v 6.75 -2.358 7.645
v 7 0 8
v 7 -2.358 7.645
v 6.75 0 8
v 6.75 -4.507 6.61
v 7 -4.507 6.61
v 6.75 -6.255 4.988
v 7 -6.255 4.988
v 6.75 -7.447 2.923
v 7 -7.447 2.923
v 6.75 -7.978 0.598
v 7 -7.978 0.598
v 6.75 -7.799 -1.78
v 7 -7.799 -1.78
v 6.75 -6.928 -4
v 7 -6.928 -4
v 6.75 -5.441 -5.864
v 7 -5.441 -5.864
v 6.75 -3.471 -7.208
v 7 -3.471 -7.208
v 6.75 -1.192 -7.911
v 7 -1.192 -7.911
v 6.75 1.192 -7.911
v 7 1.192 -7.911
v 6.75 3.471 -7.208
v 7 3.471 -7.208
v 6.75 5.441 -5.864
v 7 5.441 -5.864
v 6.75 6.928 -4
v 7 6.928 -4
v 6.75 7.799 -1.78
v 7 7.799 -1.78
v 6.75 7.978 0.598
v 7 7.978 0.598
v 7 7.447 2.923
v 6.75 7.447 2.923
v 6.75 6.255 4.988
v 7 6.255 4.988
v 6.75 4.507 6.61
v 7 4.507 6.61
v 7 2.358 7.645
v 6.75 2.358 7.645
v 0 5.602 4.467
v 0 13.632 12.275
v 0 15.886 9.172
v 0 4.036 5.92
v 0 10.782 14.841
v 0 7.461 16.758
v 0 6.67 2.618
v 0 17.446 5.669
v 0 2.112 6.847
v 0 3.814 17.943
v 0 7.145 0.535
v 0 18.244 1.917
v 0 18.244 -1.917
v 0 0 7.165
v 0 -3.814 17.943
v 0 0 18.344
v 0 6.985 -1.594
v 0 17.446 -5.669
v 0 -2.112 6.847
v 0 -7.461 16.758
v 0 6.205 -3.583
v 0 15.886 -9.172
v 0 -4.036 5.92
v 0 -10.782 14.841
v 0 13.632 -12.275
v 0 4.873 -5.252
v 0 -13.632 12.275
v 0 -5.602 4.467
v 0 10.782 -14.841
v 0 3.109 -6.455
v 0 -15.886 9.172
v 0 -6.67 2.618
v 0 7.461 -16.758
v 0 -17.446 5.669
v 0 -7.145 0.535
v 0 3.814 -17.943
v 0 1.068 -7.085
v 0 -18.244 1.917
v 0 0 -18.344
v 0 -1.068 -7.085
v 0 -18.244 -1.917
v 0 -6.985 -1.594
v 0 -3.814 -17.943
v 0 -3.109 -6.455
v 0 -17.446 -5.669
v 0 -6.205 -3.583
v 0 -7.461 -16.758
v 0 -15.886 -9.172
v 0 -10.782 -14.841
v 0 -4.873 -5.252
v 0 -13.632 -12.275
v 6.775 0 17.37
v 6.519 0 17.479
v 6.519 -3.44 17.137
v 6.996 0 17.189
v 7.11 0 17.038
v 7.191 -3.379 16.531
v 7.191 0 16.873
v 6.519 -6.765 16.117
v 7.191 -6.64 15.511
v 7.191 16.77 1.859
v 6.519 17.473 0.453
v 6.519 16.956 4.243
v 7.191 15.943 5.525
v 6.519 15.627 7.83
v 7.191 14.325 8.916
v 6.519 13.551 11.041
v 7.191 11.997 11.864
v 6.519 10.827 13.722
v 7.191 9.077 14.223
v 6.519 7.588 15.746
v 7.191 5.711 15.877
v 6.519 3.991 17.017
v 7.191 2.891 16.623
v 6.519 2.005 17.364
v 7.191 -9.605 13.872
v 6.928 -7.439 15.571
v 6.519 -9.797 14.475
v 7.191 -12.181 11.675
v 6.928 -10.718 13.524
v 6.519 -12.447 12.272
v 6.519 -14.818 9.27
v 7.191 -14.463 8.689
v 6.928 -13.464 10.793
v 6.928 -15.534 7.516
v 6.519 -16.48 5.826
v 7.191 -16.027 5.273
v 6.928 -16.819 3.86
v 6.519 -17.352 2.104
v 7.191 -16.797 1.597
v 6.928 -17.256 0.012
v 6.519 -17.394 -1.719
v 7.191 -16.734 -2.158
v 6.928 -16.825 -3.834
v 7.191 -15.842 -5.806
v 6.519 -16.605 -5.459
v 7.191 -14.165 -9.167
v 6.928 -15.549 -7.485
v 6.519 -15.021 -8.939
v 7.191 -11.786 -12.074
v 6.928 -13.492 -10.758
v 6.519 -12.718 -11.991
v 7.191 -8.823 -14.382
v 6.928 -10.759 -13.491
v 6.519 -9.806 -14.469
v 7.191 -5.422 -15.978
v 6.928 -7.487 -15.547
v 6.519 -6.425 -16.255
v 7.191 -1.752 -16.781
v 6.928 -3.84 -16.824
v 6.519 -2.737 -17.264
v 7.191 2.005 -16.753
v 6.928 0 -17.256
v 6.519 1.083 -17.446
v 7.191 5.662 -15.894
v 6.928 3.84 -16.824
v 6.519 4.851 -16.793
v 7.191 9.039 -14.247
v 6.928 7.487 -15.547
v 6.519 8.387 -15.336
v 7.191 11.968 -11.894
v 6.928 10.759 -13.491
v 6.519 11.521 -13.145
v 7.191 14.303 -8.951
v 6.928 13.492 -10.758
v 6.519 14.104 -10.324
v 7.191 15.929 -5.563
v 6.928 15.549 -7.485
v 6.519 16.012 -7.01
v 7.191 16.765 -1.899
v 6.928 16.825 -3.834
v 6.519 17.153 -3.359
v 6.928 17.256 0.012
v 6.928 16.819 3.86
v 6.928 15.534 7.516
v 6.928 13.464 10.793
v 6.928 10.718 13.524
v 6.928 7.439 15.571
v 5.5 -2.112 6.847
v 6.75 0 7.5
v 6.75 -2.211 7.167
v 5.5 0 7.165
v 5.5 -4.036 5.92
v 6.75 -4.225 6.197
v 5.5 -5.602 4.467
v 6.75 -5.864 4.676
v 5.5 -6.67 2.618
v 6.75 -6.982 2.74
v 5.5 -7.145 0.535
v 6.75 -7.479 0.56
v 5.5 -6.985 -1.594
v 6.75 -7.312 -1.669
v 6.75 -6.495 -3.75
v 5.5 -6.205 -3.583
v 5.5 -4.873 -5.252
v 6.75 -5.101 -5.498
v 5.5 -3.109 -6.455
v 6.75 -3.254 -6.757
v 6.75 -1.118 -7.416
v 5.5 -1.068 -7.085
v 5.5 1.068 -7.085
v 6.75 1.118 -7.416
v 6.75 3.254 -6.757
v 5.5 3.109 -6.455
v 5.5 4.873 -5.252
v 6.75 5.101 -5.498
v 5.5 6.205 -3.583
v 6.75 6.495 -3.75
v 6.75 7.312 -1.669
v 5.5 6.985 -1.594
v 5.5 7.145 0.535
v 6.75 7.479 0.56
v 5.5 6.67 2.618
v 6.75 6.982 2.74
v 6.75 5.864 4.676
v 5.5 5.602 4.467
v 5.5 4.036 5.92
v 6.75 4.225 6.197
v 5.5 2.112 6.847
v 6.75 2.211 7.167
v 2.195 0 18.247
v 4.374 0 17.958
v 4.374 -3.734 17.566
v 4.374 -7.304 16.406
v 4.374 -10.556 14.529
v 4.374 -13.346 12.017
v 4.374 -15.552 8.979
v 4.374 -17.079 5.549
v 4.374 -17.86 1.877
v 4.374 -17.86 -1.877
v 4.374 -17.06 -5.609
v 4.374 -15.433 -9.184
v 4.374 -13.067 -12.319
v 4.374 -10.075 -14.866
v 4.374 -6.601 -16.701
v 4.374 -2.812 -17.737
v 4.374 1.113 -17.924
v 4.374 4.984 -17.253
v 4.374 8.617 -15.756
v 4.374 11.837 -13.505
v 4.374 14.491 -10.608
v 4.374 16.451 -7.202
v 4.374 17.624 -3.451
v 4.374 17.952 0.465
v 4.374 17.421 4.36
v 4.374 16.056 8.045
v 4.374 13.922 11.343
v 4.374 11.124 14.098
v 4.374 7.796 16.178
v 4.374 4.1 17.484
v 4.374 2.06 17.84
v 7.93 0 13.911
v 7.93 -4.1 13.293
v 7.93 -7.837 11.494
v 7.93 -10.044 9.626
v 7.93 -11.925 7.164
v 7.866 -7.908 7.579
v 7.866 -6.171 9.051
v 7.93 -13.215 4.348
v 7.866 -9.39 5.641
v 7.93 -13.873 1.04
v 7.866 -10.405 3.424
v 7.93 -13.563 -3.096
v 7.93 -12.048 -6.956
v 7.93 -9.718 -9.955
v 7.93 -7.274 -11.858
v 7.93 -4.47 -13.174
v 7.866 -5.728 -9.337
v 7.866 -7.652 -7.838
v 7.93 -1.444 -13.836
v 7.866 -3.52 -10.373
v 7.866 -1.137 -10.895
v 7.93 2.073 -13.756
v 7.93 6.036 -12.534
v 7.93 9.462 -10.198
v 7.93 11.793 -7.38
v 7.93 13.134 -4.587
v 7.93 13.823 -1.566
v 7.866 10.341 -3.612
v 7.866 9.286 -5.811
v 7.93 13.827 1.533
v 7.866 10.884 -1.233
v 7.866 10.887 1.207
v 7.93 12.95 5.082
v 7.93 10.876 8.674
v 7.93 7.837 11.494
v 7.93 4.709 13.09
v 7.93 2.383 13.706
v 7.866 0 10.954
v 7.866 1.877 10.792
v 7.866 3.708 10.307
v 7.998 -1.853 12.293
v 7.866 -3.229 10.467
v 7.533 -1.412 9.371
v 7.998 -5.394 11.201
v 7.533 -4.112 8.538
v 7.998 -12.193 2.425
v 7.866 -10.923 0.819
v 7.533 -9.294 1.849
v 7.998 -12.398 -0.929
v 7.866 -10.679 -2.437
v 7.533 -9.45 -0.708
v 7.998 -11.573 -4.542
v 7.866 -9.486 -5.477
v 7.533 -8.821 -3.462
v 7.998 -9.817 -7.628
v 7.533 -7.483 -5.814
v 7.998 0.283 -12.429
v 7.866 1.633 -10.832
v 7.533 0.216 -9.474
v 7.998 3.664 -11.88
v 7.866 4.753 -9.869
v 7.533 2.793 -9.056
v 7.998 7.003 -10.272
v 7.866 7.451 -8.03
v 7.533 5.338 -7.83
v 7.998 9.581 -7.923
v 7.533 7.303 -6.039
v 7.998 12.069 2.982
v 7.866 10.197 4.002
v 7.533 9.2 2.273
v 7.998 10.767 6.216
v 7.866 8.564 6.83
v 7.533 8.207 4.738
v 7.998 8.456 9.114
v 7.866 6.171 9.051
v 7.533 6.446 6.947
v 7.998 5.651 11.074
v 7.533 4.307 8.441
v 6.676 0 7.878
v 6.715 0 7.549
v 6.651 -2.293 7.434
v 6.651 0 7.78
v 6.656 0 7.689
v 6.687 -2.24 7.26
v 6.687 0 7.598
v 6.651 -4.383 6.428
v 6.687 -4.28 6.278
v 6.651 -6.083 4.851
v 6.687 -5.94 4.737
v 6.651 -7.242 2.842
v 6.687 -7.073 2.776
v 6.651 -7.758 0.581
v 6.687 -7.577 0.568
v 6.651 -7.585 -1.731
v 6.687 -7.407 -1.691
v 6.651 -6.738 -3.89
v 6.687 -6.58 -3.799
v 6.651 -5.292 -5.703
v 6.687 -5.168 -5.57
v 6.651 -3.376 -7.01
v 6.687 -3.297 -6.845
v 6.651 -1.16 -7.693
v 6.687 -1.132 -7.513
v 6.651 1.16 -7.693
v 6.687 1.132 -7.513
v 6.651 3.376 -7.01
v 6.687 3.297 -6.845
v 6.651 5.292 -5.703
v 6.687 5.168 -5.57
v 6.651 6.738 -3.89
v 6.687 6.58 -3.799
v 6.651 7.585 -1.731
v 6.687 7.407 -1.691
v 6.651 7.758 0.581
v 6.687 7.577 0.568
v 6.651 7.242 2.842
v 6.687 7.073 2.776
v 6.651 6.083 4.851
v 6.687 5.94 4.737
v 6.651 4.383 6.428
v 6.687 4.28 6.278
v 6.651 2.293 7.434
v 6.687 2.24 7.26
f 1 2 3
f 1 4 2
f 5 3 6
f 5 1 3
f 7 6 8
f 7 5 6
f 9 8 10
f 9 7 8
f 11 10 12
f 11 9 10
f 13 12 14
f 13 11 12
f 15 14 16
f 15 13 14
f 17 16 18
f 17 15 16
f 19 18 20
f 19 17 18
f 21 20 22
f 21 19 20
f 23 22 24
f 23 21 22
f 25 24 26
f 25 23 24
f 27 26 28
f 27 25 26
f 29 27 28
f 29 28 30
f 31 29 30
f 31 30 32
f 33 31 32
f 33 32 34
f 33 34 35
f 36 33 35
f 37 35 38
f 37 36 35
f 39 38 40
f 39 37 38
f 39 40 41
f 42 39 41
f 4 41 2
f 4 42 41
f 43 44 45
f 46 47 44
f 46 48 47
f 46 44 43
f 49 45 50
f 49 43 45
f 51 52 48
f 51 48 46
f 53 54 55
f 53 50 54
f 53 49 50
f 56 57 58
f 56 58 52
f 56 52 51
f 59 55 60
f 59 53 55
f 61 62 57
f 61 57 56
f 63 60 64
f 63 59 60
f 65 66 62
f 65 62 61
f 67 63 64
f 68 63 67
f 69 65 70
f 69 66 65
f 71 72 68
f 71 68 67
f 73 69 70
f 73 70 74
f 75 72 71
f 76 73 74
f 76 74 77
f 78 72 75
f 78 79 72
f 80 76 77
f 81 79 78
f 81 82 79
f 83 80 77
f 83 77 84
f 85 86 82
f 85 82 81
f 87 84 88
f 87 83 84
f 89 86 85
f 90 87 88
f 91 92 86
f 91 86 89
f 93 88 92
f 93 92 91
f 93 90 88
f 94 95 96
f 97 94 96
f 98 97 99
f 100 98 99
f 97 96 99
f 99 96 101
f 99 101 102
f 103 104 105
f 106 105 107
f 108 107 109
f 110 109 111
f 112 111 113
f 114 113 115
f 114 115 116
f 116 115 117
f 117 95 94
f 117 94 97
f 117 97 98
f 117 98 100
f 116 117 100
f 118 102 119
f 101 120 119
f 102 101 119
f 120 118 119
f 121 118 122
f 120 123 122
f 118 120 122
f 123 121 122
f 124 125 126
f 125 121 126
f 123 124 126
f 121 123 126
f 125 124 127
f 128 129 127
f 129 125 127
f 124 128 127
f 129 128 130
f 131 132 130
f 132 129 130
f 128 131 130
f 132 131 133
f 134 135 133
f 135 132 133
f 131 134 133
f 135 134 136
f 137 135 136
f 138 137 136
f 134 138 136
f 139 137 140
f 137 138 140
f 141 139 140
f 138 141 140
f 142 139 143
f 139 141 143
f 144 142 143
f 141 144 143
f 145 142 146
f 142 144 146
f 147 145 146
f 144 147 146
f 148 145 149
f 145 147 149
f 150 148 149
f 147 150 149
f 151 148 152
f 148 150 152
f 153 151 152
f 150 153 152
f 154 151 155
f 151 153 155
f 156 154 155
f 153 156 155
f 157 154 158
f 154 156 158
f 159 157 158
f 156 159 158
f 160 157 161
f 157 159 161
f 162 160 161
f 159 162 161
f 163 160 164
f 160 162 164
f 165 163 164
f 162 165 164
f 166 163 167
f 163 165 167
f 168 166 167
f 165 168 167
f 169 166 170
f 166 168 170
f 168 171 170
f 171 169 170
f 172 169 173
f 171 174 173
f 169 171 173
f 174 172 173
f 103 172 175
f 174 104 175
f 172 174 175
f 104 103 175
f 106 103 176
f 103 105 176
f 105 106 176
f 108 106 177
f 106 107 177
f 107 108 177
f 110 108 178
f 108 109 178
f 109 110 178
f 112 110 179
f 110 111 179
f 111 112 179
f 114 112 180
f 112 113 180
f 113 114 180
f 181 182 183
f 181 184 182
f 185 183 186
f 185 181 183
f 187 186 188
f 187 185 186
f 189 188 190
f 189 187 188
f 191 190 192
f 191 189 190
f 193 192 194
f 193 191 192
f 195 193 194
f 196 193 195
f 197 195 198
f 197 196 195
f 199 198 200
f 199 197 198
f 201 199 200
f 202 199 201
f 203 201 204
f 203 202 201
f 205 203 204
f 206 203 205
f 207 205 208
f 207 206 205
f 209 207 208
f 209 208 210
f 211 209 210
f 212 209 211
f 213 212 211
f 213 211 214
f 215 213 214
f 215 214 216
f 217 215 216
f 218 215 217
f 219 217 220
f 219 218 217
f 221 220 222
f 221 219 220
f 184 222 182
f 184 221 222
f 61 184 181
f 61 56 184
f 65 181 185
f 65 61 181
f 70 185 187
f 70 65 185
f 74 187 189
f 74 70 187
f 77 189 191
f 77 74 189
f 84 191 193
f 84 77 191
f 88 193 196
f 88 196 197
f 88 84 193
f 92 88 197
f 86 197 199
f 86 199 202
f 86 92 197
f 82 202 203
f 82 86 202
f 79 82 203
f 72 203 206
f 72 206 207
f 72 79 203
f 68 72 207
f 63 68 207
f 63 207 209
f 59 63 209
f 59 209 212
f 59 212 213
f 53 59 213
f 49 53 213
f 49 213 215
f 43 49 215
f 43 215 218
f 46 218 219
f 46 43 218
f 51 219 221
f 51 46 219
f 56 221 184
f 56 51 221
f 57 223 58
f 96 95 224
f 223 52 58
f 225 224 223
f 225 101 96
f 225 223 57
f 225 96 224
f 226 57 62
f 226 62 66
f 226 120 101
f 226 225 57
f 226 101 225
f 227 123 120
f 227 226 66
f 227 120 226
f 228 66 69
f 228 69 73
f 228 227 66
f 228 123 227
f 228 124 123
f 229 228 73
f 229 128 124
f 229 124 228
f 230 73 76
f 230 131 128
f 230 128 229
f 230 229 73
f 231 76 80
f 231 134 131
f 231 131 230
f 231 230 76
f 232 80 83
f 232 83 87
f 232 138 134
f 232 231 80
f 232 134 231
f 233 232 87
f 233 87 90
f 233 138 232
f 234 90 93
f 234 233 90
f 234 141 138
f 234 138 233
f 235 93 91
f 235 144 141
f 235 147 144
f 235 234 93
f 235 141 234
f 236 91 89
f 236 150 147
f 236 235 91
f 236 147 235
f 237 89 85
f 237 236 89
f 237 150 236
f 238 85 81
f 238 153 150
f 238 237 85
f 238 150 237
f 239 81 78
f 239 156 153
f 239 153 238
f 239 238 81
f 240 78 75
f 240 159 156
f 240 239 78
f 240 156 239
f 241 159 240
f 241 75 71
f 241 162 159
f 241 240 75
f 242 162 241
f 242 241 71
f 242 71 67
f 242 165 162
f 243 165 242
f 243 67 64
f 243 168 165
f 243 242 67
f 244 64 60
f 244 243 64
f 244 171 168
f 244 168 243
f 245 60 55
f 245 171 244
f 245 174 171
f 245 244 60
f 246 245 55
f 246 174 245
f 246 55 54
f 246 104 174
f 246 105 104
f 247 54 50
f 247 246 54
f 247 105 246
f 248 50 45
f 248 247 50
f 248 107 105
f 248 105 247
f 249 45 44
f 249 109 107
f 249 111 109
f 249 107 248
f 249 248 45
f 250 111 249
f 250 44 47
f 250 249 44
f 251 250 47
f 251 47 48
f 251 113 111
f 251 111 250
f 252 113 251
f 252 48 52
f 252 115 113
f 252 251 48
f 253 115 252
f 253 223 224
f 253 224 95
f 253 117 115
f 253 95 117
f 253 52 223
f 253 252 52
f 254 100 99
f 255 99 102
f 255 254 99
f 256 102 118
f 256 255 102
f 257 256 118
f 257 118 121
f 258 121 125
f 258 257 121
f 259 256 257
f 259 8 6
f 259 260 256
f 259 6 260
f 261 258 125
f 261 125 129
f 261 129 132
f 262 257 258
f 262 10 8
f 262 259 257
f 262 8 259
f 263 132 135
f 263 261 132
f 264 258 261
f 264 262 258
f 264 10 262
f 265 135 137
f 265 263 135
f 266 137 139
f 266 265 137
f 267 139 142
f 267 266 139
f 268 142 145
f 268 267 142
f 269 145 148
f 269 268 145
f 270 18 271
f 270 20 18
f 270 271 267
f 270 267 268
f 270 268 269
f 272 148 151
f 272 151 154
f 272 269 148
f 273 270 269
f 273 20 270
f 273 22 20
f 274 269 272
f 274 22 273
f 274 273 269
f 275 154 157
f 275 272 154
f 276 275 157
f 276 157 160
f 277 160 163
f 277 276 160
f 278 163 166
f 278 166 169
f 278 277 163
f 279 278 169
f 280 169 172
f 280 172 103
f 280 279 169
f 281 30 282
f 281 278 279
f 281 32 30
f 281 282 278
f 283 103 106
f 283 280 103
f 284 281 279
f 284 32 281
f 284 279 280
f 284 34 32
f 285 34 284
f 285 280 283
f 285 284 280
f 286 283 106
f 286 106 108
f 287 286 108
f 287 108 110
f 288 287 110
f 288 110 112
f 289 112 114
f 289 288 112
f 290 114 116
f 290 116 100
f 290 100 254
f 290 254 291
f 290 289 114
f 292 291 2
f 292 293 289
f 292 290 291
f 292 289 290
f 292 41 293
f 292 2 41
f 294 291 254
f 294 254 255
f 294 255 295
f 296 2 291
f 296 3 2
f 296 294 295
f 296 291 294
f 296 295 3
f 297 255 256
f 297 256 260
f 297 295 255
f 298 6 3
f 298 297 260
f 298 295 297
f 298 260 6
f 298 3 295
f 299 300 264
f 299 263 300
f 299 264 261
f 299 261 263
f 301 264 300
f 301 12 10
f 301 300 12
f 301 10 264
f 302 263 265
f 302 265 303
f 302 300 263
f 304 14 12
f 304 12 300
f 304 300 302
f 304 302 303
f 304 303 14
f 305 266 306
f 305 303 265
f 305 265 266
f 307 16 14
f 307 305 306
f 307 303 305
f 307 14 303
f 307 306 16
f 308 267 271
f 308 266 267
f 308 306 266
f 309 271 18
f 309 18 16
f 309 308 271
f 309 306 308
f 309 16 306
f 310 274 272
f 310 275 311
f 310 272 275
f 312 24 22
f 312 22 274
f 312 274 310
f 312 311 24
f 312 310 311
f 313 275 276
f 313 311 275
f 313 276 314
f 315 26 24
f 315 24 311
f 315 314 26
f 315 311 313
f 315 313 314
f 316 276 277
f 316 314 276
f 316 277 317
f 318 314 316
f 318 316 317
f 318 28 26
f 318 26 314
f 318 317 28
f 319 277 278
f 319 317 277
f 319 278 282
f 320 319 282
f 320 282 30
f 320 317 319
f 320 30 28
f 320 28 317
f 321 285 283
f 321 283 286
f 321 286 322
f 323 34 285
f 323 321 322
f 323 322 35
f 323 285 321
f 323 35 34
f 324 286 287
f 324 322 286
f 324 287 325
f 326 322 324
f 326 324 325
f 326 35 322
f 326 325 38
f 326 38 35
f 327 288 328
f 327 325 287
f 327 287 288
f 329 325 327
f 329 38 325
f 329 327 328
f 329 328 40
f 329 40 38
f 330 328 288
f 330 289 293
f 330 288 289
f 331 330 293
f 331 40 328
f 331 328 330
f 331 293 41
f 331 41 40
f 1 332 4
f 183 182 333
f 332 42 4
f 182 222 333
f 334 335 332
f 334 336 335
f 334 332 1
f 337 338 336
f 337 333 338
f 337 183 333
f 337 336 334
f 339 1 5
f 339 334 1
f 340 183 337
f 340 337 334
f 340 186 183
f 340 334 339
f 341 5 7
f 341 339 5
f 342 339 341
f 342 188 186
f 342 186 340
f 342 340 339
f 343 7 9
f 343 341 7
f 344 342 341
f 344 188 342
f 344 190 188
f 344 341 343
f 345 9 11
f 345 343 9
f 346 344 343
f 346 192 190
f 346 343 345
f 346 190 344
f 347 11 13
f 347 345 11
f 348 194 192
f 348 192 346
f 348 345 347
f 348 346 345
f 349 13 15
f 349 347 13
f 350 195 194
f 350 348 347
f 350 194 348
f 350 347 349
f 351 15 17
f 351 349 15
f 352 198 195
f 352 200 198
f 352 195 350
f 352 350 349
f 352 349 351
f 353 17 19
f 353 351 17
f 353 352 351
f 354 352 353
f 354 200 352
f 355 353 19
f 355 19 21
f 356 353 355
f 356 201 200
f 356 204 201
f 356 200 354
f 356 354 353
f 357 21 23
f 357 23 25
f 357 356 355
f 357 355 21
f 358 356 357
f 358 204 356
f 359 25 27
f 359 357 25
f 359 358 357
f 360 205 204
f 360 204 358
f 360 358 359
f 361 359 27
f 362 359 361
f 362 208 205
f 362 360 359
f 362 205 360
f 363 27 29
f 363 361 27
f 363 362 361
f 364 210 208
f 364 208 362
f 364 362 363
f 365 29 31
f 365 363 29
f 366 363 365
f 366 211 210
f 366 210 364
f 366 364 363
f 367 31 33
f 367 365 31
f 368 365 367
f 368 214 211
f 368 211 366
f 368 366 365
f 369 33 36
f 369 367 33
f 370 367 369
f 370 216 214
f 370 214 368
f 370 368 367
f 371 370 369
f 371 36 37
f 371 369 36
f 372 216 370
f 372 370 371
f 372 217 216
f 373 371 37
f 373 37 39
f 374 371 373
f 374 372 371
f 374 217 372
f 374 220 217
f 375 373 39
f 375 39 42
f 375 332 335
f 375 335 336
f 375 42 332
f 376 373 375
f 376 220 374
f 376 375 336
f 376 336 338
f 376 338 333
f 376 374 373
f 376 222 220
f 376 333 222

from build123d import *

# Parameters (mm, degrees)
REDONDEO8_R = 1


with BuildPart() as part:
    # Croquis1 → Revoluci_n1 (revolve)
    with BuildSketch(Plane(origin=(0, 0, 0), x_dir=(1, 0, 0), z_dir=(0, 1, 0)), mode=Mode.PRIVATE) as revoluci_n1_sk:
        with BuildLine():
            add(Edge.make_bspline(
                [(6.75, 8), (6.55, 7.75), (6.75, 7.5)],
                knots=[0, 0, 0, 1, 1, 1], degree=2))
            Line((6.75, 7.5), (5.5, 7.165063509))
            Line((5.5, 7.165063509), (0, 7.165063509))
            Line((0, 7.165063509), (0, 18.344))
            ThreePointArc((0, 18.344), (3.535533906, 18.092737342), (7, 17.344))
            add(Edge.make_bspline(
                [(7, 17.344), (9.000873043, 12.66305), (7, 8)],
                knots=[0, 0, 0, 1, 1, 1], degree=2))
            Line((7, 8), (6.75, 8))
        make_face()
    revolve(revoluci_n1_sk.sketch.rotate(Axis((-281.405379576, 0, 0), (1, 0, 0)), 180), axis=Axis((-281.405379576, 0, 0), (1, 0, 0)))

    # Redondeo8
    redondeo8_edges = [part.edges().sort_by_distance(p)[0] for p in [
        (7, 0, -17.344),
    ]]
    fillet(redondeo8_edges, radius=REDONDEO8_R)


solid = part.part
